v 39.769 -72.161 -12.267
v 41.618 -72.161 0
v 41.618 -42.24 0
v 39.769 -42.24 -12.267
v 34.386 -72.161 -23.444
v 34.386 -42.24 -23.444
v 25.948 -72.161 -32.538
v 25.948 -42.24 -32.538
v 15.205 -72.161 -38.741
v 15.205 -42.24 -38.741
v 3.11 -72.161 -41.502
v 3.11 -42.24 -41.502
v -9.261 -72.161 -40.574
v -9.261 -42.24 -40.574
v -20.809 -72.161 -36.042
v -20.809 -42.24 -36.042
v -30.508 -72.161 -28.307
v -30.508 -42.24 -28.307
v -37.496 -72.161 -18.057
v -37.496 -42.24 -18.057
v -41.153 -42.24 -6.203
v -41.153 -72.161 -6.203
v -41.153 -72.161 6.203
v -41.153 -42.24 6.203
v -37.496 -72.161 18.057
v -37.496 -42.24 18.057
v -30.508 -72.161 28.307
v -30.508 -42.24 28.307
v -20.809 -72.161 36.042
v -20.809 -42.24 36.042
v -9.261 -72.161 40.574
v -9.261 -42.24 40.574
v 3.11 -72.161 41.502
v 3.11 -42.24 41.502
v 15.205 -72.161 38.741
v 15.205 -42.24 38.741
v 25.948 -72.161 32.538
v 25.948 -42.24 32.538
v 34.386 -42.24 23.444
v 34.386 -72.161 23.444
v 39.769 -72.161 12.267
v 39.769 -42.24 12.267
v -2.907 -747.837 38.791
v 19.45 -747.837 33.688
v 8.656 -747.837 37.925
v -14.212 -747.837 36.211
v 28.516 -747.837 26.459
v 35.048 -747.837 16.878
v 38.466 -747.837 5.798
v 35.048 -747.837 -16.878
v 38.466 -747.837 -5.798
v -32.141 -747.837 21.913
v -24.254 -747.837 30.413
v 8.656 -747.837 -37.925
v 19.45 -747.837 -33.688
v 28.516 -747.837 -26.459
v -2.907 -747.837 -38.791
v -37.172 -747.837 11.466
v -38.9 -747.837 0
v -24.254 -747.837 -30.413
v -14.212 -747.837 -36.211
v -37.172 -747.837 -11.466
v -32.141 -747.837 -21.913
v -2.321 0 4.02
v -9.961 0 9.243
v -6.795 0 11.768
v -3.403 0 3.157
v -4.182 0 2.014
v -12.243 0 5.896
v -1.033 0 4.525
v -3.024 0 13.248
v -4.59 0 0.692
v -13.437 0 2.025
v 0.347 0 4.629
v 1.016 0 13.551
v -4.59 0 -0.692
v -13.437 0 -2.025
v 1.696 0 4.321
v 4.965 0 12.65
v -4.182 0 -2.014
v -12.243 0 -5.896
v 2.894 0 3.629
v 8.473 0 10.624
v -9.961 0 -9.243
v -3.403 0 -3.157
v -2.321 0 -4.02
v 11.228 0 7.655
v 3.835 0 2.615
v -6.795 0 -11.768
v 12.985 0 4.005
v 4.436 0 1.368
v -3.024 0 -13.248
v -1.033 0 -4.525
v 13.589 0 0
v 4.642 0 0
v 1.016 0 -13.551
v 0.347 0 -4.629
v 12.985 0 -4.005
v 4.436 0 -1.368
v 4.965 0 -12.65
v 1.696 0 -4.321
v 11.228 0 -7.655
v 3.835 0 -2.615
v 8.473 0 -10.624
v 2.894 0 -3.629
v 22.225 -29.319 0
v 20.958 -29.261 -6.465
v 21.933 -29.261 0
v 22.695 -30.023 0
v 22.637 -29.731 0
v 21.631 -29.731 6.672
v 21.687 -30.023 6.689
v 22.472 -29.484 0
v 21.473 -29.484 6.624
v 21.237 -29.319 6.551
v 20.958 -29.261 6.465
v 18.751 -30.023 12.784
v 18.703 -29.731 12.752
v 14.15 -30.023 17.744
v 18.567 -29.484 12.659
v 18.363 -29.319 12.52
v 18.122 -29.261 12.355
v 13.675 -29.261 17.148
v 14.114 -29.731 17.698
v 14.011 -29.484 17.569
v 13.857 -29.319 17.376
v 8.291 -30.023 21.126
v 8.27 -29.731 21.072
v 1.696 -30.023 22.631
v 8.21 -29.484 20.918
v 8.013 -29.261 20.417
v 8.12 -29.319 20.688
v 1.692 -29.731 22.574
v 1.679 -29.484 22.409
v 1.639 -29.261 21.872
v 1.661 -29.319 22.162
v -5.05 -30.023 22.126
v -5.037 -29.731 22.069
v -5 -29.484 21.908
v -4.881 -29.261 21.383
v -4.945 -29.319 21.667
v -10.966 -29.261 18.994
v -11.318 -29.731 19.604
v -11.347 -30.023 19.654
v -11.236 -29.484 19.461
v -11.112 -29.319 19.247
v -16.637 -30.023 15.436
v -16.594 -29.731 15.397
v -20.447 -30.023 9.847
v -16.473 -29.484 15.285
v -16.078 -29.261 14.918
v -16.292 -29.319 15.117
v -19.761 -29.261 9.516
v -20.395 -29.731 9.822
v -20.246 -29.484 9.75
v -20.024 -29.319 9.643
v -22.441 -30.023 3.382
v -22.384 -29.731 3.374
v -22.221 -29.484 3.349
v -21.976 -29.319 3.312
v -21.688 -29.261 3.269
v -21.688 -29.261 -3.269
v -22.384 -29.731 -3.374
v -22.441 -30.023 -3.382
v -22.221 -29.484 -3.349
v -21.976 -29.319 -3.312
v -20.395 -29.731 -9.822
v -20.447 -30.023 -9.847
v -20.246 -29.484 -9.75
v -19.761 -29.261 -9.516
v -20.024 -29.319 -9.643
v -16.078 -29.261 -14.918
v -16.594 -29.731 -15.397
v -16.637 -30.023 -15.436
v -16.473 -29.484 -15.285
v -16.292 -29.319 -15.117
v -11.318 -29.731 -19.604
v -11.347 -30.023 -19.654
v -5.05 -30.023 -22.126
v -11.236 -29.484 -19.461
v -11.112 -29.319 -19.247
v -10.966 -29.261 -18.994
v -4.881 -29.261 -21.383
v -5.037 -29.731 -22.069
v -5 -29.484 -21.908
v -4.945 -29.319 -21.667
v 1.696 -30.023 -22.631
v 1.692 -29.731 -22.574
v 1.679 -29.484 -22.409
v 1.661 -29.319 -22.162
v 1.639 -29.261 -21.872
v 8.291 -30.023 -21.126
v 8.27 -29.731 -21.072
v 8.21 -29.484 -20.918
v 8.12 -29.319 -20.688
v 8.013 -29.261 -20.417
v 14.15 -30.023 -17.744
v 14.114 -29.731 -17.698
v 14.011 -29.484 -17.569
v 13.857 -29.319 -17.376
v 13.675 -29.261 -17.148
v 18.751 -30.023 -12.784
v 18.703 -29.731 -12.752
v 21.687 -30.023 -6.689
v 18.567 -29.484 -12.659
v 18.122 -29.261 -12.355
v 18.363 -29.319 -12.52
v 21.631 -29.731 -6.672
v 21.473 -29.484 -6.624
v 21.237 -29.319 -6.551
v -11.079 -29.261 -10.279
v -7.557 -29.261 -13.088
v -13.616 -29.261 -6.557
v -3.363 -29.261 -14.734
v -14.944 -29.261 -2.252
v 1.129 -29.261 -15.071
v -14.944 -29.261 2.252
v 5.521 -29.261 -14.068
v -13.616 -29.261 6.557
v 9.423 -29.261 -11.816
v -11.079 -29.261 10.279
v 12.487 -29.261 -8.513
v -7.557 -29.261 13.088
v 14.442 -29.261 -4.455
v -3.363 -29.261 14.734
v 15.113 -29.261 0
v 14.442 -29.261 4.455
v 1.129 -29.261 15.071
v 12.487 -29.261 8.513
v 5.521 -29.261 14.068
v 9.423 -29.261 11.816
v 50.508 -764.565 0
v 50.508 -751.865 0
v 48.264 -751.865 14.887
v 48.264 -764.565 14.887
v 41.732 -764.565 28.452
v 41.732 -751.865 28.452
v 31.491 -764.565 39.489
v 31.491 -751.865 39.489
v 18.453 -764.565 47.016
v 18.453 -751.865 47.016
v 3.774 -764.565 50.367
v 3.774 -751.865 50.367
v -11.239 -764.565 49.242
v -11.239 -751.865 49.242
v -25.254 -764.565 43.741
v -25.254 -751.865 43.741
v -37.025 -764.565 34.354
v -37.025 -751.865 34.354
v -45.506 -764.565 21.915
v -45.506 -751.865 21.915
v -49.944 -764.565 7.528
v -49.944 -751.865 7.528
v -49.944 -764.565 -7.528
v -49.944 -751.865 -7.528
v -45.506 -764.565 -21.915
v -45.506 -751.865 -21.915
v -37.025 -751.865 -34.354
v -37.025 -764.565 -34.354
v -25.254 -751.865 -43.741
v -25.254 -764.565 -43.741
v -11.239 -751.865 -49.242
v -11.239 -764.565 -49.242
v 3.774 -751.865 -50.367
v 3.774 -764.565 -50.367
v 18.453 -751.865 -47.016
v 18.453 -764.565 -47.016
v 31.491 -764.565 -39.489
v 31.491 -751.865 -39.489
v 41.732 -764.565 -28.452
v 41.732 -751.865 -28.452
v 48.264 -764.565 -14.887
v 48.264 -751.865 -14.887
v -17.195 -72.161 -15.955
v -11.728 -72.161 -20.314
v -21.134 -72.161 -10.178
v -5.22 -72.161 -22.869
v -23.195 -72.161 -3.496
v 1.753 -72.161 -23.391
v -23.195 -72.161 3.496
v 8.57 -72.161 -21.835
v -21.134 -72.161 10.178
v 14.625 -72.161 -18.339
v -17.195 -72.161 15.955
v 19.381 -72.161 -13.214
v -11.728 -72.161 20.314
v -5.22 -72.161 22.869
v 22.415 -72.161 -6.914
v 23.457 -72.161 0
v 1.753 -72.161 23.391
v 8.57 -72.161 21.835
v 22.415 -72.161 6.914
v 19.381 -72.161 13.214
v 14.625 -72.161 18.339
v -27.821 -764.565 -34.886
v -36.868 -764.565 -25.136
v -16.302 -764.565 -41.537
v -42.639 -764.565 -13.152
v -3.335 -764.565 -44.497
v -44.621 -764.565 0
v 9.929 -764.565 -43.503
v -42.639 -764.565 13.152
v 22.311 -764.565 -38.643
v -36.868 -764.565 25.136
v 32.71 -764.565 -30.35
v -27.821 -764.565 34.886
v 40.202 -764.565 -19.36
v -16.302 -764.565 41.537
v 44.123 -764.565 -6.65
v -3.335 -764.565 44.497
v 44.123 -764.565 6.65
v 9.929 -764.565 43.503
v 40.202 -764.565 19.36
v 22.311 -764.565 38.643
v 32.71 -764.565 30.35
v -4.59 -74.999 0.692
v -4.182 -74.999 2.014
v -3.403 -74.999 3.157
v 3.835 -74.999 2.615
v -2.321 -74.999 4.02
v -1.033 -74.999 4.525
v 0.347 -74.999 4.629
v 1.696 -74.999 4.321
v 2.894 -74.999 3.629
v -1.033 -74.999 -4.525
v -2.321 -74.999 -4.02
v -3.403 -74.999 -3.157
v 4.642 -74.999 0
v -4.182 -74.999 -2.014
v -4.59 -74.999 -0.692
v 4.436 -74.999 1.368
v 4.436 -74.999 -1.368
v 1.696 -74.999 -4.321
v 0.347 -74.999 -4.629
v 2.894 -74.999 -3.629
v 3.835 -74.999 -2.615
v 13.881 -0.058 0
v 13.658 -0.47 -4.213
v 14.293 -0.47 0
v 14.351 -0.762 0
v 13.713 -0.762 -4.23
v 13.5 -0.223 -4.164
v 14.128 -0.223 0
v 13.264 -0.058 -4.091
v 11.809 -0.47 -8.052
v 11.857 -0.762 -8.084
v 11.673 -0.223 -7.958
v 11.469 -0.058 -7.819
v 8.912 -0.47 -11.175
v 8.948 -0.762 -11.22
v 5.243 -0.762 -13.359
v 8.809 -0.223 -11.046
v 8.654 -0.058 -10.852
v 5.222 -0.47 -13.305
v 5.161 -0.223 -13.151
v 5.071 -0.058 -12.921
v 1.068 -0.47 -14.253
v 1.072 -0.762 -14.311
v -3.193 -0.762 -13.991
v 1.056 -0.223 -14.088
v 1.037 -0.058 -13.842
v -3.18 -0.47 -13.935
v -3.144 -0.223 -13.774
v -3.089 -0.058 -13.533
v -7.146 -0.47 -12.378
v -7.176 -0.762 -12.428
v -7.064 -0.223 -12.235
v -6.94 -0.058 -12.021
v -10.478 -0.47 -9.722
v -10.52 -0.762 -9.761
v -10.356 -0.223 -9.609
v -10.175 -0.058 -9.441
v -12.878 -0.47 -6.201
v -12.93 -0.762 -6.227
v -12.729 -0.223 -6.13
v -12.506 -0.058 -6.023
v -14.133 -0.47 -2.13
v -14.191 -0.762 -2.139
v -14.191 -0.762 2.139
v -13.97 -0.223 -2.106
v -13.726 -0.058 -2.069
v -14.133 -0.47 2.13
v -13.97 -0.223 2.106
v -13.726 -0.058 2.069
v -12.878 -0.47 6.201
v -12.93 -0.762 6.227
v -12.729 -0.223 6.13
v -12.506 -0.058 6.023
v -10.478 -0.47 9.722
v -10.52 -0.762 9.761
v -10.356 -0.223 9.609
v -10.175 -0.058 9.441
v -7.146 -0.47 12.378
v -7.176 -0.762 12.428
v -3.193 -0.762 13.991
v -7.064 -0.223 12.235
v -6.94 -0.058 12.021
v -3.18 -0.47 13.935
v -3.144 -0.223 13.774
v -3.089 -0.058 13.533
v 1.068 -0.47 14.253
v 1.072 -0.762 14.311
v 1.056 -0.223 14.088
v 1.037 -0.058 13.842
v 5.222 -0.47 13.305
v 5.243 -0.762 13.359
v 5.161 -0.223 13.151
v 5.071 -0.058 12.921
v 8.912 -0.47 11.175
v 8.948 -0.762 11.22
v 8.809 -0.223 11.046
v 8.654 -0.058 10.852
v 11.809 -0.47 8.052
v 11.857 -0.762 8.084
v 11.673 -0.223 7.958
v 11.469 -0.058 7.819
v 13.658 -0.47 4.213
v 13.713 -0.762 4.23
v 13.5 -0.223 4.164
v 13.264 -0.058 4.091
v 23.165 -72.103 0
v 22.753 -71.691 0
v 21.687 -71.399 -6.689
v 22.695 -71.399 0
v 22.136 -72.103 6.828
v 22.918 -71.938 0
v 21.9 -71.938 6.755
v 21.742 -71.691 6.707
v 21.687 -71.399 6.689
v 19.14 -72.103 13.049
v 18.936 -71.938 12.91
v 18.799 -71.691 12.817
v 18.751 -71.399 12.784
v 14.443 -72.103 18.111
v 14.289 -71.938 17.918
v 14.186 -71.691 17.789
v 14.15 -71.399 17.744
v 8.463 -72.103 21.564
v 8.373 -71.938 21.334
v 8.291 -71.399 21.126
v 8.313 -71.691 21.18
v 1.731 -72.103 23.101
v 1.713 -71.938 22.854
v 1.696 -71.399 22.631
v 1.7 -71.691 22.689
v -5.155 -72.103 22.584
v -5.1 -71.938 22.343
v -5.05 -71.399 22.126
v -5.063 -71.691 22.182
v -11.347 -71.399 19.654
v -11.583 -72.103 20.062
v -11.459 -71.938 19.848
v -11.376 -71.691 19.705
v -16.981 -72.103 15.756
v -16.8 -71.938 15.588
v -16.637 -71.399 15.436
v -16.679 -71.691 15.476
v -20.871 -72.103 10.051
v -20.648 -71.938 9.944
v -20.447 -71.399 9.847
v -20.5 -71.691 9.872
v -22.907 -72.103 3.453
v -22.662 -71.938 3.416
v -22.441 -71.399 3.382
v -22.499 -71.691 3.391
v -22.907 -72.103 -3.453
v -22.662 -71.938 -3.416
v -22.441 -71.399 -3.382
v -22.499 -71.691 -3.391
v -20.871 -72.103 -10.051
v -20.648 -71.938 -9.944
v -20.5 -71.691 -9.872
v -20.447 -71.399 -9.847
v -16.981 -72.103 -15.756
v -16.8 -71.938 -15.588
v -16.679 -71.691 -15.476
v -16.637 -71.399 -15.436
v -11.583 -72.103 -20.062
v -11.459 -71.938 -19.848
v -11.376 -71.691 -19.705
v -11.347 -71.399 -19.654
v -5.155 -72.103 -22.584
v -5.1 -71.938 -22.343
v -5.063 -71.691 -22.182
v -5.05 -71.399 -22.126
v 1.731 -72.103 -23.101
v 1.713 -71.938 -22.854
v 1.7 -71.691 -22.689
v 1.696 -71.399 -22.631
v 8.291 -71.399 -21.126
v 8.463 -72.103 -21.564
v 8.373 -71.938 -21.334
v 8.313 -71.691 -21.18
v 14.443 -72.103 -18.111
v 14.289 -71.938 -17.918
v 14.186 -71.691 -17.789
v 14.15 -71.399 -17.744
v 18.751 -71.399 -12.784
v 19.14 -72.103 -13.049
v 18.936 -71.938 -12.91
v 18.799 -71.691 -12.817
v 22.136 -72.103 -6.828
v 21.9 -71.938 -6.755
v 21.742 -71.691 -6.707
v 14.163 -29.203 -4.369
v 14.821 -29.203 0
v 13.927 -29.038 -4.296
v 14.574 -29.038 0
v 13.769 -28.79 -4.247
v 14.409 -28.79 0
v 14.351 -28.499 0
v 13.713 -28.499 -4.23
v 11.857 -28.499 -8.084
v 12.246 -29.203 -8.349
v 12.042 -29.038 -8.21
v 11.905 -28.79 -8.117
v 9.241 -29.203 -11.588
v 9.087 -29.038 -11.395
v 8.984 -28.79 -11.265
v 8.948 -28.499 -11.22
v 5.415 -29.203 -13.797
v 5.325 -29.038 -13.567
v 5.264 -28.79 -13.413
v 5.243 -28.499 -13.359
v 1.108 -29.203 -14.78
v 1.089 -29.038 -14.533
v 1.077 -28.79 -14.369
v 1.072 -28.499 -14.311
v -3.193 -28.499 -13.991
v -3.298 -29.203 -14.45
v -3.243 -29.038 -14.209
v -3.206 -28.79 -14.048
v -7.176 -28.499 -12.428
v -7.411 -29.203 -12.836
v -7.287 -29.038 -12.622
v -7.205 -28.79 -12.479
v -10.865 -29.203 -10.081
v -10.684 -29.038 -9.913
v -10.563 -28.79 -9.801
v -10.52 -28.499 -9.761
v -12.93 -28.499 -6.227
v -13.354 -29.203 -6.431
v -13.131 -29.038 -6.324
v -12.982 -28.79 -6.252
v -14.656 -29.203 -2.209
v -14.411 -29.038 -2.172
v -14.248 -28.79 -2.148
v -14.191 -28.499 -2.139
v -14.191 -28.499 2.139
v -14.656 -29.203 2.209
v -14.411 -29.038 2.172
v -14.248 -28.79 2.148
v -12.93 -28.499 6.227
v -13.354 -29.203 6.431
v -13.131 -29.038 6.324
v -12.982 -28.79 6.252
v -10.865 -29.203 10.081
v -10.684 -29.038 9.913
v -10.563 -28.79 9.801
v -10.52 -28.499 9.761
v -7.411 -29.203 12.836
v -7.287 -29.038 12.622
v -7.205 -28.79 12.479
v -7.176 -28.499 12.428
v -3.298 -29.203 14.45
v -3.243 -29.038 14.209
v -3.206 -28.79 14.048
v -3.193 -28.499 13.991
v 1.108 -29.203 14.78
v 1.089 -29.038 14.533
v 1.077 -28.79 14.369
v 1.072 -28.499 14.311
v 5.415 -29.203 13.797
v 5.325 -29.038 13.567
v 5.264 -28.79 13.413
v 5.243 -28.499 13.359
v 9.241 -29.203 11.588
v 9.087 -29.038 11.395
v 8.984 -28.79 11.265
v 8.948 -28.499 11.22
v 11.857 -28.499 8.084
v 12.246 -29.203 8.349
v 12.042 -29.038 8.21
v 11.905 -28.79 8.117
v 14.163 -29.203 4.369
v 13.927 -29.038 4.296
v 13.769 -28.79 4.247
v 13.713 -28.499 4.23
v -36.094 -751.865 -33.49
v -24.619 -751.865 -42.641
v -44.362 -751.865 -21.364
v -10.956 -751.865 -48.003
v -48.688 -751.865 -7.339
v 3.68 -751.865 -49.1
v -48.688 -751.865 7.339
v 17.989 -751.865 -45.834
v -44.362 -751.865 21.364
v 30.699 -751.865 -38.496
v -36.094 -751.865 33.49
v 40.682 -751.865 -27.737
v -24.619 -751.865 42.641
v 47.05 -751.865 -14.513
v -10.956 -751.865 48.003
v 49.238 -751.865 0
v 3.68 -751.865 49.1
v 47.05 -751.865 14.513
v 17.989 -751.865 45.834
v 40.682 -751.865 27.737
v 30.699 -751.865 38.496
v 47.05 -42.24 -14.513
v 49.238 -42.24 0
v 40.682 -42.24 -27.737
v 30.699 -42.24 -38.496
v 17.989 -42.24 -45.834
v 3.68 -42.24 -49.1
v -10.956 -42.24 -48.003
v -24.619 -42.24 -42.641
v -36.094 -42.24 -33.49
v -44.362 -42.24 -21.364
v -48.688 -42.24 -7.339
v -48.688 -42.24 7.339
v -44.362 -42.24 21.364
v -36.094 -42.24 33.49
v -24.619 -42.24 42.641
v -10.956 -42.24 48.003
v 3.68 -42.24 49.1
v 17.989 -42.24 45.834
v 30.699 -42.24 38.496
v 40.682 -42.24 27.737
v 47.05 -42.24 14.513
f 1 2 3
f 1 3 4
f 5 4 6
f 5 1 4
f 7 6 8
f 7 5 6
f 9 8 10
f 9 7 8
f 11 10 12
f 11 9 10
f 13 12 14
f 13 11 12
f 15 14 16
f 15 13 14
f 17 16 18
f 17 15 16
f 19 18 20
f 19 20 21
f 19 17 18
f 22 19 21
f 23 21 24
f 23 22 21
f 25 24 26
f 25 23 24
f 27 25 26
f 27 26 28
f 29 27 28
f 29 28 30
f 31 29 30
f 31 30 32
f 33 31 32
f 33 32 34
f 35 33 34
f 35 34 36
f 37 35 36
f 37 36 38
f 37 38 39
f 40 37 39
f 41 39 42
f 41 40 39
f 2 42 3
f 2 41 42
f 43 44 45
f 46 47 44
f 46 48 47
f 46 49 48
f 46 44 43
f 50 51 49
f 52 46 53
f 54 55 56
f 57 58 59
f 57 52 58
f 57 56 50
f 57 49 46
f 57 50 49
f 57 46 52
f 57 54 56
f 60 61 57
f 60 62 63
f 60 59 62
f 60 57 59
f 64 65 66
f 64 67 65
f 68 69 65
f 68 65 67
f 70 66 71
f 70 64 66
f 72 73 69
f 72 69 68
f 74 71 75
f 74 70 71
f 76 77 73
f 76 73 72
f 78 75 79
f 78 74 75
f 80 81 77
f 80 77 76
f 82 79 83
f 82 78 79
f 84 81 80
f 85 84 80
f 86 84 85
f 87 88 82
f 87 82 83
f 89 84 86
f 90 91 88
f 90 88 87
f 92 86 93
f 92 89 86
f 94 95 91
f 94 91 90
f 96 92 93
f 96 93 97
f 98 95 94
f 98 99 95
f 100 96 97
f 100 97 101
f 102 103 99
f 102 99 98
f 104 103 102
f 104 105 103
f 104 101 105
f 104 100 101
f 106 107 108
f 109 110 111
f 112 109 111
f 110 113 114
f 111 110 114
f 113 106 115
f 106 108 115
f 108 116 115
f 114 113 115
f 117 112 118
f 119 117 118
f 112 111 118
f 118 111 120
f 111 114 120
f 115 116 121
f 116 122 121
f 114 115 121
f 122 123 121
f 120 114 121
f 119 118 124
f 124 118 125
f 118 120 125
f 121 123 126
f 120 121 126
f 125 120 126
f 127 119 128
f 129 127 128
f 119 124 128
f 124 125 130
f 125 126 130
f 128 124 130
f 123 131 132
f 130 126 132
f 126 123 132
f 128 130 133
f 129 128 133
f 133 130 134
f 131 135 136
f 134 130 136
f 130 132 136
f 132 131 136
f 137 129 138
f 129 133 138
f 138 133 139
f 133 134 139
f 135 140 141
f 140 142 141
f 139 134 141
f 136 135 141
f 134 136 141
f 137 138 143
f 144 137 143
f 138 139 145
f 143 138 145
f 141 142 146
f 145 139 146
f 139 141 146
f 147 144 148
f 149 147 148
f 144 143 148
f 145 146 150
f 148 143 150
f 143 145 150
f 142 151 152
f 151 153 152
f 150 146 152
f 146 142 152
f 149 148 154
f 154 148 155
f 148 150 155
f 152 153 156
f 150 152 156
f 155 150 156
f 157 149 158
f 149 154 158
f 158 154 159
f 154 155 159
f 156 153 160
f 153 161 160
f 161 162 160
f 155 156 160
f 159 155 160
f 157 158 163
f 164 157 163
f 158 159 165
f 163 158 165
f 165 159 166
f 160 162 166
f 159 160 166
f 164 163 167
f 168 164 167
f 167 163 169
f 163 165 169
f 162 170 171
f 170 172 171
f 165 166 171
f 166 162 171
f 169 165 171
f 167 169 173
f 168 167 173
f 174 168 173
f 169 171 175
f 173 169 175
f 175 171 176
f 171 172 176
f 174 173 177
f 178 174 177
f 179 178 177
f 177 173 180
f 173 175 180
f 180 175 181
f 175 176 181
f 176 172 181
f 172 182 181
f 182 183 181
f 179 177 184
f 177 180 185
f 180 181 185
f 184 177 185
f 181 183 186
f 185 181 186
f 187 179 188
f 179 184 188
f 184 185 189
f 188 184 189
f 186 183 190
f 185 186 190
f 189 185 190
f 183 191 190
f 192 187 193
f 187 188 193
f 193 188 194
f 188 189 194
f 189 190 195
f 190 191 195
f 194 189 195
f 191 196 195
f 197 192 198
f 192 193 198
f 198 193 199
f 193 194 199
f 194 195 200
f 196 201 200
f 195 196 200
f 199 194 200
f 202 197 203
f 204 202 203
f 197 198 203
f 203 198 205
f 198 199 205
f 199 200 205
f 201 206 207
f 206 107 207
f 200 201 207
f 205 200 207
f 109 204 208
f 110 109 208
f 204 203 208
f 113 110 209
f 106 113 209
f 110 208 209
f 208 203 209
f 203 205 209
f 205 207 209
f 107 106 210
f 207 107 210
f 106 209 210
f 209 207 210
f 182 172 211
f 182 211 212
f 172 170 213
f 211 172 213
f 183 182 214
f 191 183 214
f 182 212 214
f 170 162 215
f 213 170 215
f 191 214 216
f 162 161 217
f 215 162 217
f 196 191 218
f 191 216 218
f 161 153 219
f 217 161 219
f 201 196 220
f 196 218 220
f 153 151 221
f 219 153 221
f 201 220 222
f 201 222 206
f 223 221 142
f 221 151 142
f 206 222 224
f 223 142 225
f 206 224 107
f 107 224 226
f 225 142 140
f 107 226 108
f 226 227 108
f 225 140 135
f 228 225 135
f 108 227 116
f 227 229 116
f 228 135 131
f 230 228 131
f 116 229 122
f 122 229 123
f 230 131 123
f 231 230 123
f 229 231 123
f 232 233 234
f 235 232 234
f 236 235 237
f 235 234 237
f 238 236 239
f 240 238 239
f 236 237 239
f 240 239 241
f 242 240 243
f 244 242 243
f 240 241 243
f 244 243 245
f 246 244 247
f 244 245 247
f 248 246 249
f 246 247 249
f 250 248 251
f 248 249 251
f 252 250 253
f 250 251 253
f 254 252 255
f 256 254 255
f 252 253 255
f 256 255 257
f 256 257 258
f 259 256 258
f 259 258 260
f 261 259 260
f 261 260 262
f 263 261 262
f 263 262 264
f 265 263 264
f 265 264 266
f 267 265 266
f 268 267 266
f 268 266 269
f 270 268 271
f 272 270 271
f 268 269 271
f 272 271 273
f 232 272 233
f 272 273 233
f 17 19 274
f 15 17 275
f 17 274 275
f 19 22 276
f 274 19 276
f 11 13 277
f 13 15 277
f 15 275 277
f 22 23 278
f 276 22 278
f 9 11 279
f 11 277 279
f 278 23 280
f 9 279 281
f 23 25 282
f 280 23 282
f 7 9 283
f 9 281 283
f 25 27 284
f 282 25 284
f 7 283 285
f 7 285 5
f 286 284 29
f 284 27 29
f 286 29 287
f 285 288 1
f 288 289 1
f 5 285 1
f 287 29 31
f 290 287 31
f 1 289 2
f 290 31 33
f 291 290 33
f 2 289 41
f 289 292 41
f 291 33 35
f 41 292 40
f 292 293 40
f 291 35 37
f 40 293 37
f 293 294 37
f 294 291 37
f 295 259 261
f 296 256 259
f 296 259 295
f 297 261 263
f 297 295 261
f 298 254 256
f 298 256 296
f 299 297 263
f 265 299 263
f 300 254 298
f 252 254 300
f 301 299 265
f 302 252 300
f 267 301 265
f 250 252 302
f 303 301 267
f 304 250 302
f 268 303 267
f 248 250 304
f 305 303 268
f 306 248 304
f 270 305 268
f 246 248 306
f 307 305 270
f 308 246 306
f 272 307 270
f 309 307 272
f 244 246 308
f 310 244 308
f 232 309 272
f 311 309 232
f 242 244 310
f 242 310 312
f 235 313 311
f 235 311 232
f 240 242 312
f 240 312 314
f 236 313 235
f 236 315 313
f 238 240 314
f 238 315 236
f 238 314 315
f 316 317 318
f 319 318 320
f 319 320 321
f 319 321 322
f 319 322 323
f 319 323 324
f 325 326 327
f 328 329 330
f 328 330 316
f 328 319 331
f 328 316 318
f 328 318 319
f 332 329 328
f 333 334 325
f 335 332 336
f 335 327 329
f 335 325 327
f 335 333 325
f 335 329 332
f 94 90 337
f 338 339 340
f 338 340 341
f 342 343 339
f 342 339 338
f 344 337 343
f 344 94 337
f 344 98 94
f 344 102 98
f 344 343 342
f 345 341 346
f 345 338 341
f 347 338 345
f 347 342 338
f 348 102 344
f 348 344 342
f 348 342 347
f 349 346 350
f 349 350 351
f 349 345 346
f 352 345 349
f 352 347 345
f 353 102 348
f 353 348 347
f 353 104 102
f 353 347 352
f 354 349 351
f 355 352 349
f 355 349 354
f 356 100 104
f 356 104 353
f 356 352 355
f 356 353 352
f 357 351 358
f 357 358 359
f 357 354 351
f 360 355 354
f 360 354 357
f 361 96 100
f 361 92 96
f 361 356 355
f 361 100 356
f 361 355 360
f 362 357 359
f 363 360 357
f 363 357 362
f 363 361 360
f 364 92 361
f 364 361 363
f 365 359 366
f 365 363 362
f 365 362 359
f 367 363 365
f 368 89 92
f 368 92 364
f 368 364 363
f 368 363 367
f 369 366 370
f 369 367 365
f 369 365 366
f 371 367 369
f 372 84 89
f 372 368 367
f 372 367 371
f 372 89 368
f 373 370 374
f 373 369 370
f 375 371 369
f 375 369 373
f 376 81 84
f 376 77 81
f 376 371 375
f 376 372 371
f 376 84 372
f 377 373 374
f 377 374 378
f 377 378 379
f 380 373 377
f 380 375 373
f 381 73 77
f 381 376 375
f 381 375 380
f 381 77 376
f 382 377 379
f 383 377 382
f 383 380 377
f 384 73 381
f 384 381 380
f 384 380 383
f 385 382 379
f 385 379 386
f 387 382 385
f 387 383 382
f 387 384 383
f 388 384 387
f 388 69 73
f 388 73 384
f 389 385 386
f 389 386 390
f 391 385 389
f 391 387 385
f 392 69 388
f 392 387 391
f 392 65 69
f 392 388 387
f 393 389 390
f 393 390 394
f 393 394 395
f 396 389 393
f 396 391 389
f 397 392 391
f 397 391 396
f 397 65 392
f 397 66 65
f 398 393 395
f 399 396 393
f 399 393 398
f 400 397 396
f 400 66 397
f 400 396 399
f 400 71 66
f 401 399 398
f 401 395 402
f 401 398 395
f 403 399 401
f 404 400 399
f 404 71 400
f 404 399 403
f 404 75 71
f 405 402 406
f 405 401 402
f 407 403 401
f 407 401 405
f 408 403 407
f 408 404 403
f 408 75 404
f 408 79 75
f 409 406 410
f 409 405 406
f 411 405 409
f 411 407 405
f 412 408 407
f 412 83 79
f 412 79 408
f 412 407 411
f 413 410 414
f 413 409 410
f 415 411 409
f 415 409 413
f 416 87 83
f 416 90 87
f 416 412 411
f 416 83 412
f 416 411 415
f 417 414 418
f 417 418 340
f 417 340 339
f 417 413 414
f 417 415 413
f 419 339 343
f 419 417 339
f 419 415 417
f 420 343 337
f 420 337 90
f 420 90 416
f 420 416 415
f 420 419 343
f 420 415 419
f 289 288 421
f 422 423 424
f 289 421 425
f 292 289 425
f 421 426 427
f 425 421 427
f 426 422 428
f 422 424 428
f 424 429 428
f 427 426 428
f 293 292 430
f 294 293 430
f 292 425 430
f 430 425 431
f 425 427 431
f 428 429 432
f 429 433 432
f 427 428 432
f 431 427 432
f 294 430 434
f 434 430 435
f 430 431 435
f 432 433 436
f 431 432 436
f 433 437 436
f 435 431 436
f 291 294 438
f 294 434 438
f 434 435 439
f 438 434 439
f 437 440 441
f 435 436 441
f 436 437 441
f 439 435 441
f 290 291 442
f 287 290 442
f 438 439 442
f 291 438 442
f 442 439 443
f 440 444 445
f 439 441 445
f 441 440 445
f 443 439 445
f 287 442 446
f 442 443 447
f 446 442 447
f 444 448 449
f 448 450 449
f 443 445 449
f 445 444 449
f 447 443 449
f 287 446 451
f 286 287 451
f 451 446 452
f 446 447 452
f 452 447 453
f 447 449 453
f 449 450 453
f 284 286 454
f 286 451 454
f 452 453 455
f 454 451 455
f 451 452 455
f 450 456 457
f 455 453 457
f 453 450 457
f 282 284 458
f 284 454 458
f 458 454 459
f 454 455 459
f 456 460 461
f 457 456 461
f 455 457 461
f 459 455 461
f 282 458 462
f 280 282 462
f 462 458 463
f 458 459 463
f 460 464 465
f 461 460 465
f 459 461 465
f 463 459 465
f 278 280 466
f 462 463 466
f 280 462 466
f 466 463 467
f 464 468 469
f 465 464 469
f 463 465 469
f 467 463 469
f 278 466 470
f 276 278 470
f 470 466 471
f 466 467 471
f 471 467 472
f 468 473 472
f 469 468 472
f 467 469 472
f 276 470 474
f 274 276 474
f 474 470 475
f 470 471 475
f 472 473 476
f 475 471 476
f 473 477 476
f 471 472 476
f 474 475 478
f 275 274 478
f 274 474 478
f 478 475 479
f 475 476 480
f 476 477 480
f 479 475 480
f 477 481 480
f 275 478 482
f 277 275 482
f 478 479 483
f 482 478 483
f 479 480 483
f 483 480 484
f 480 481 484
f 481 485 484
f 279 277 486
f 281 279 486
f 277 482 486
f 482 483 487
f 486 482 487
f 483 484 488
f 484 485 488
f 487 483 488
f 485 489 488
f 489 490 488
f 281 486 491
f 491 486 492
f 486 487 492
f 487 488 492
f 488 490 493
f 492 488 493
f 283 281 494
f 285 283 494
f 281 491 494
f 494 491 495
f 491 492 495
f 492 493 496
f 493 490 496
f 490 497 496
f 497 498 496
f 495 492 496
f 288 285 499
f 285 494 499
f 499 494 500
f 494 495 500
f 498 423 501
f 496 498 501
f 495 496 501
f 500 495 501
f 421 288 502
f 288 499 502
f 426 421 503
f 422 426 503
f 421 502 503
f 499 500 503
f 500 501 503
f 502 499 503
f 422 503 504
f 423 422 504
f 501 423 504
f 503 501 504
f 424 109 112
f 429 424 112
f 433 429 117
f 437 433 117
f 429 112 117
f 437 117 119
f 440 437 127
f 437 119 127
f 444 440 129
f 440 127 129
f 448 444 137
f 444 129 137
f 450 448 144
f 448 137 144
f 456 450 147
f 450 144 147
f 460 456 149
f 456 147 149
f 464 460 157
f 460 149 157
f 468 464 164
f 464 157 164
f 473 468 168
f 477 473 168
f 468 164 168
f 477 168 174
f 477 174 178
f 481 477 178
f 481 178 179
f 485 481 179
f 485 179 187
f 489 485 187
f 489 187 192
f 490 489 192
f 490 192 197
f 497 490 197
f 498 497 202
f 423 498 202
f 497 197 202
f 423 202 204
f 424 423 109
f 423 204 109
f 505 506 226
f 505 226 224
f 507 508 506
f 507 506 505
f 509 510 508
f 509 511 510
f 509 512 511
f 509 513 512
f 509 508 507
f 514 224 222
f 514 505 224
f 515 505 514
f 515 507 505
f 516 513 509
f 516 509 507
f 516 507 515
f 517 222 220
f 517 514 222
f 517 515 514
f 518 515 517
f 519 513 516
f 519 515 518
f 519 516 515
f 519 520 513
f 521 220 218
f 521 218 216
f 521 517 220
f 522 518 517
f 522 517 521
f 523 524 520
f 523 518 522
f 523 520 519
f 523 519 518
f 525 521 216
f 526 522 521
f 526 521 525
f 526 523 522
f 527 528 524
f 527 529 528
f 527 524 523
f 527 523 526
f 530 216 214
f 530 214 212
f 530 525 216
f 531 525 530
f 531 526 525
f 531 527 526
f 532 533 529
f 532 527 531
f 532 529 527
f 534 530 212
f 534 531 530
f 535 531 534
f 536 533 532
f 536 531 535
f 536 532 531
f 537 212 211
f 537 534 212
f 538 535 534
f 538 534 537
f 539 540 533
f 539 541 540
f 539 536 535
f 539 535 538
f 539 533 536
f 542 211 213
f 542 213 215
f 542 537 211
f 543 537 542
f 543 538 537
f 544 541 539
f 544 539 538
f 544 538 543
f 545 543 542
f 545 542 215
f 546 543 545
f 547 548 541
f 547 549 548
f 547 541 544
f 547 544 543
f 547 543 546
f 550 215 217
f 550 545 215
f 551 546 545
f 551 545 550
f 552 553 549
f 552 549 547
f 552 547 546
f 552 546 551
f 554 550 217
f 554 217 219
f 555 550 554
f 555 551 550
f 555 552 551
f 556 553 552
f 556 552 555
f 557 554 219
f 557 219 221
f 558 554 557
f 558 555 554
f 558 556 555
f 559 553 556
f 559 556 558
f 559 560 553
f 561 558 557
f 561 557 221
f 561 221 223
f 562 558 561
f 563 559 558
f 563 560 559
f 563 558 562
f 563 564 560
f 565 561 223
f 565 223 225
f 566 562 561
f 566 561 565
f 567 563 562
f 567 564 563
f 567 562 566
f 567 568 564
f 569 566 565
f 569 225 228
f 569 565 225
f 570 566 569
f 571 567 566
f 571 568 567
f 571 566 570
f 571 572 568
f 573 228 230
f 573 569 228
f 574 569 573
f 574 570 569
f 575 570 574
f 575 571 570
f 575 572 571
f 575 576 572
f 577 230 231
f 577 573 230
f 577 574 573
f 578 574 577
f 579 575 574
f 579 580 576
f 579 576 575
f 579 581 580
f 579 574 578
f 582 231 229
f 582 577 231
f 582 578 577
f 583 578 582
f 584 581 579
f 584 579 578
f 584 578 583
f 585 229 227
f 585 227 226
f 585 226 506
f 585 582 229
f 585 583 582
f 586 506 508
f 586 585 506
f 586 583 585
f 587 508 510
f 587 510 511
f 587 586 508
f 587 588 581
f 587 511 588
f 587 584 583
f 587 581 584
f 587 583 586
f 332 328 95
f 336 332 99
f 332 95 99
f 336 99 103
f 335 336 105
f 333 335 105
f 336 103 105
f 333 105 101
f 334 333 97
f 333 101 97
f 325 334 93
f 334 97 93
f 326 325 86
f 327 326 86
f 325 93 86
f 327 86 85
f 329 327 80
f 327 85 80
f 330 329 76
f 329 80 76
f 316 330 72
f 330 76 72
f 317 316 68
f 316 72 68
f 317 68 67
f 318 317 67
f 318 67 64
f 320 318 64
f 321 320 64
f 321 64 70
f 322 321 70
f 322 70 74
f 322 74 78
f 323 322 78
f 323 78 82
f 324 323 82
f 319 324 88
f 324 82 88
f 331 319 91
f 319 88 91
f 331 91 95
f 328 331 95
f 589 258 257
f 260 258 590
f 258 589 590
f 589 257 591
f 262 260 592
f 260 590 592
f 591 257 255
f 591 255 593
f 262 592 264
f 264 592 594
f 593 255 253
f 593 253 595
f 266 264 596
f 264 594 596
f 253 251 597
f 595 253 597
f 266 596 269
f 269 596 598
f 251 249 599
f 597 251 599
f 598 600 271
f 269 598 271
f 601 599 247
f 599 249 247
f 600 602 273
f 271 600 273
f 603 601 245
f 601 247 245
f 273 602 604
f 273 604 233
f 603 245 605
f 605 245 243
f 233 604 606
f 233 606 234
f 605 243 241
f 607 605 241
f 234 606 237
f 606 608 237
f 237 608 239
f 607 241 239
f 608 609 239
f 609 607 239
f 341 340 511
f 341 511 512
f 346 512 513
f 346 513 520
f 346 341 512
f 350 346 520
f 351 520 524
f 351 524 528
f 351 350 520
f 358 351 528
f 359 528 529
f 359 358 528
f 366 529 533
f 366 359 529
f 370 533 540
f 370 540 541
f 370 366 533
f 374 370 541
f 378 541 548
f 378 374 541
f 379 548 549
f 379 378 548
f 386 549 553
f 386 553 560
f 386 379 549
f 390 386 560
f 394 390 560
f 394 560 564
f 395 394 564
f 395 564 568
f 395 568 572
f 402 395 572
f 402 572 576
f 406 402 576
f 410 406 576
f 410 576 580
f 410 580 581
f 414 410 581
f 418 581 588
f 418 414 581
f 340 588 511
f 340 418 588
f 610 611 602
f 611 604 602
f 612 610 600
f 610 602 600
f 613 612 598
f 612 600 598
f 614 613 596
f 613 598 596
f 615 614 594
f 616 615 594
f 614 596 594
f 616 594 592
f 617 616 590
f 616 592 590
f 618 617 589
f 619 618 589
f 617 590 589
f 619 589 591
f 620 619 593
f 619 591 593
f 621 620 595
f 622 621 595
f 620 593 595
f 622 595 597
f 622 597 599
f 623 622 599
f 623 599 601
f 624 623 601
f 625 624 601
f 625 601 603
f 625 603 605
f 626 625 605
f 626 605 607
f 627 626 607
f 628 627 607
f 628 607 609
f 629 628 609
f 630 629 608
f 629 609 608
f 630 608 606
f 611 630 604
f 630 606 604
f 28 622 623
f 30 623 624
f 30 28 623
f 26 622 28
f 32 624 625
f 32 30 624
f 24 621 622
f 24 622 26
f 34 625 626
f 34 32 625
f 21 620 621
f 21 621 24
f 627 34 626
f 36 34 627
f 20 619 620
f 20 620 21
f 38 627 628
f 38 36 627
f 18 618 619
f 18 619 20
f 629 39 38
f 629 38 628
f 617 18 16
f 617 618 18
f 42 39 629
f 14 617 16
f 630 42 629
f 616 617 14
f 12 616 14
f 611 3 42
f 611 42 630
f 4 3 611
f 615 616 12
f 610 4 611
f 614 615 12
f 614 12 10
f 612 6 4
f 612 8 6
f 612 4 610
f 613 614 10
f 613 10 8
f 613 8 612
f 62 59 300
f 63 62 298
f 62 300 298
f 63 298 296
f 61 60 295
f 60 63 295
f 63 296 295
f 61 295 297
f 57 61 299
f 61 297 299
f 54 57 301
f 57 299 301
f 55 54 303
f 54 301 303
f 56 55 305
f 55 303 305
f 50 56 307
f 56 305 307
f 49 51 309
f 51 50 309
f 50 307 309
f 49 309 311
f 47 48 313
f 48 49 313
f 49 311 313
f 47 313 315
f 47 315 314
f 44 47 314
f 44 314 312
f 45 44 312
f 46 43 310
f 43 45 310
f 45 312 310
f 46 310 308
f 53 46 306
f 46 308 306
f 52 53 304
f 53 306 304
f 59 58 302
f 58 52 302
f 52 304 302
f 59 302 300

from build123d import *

# Parameters (mm, degrees)
SKETCH1_R           = 14.351
BOSS_EXTRUDE1_DEPTH = 29.2608
SKETCH2_R           = 22.6949
BOSS_EXTRUDE2_DEPTH = 42.9006
SKETCH3_R           = 49.2379
BOSS_EXTRUDE3_DEPTH = 679.704
SKETCH4_R           = 49.2379
SKETCH4_R_2         = 41.6179
BOSS_EXTRUDE4_DEPTH = 29.9212
SKETCH5_R           = 4.64185
CUT_EXTRUDE1_DEPTH  = 74.99858
SKETCH6_R           = 50.5079
BOSS_EXTRUDE5_DEPTH = 12.7
SKETCH9_R           = 38.900000051
SKETCH8_R           = 44.621320206
FILLET1_R           = 0.762


with BuildPart() as part:
    # Sketch1 → Boss-Extrude1 (new body)
    with BuildSketch(Plane(origin=(0, 0, 0), x_dir=(1, 0, 0), z_dir=(0, 1, 0))):
        Circle(SKETCH1_R)
    extrude(amount=-BOSS_EXTRUDE1_DEPTH)

    # Sketch2 → Boss-Extrude2 (add)
    with BuildSketch(Plane.XZ.offset(29.2608)):
        Circle(SKETCH2_R)
    extrude(amount=BOSS_EXTRUDE2_DEPTH)

    # Sketch3 → Boss-Extrude3 (add)
    with BuildSketch(Plane.XZ.offset(72.1614)):
        Circle(SKETCH3_R)
    extrude(amount=BOSS_EXTRUDE3_DEPTH)

    # Sketch4 → Boss-Extrude4 (add)
    with BuildSketch(Plane(origin=(0, -72.1614, 0), x_dir=(1, 0, 0), z_dir=(0, 1, 0))):
        Circle(SKETCH4_R)
        Circle(SKETCH4_R_2, mode=Mode.SUBTRACT)
    extrude(amount=BOSS_EXTRUDE4_DEPTH)

    # Sketch5 → Cut-Extrude1 (cut)
    with BuildSketch(Plane(origin=(0, 0, 0), x_dir=(1, 0, 0), z_dir=(0, 1, 0))):
        Circle(SKETCH5_R)
    extrude(amount=-CUT_EXTRUDE1_DEPTH, mode=Mode.SUBTRACT)

    # Sketch6 → Boss-Extrude5 (add)
    with BuildSketch(Plane.XZ.offset(751.8654)):
        Circle(SKETCH6_R)
    extrude(amount=BOSS_EXTRUDE5_DEPTH)

    # Sketch9 → Cut-Loft1 section 0
    with BuildSketch(Plane(origin=(0, -747.837378846, 0), x_dir=(-1, 0, 0), z_dir=(0, -1, 0))):
        Circle(SKETCH9_R)
    # Sketch8 → Cut-Loft1 section 1
    with BuildSketch(Plane.XZ.offset(764.5654)):
        Circle(SKETCH8_R)
    loft(mode=Mode.SUBTRACT)

    # Fillet1
    fillet1_edges = [part.edges().sort_by_distance(p)[0] for p in [
        (-14.351, 0, 0),
        (-14.351, -29.2608, 0),
        (-22.6949, -29.2608, 0),
        (-22.6949, -72.1614, 0),
    ]]
    fillet(fillet1_edges, radius=FILLET1_R)


solid = part.part
